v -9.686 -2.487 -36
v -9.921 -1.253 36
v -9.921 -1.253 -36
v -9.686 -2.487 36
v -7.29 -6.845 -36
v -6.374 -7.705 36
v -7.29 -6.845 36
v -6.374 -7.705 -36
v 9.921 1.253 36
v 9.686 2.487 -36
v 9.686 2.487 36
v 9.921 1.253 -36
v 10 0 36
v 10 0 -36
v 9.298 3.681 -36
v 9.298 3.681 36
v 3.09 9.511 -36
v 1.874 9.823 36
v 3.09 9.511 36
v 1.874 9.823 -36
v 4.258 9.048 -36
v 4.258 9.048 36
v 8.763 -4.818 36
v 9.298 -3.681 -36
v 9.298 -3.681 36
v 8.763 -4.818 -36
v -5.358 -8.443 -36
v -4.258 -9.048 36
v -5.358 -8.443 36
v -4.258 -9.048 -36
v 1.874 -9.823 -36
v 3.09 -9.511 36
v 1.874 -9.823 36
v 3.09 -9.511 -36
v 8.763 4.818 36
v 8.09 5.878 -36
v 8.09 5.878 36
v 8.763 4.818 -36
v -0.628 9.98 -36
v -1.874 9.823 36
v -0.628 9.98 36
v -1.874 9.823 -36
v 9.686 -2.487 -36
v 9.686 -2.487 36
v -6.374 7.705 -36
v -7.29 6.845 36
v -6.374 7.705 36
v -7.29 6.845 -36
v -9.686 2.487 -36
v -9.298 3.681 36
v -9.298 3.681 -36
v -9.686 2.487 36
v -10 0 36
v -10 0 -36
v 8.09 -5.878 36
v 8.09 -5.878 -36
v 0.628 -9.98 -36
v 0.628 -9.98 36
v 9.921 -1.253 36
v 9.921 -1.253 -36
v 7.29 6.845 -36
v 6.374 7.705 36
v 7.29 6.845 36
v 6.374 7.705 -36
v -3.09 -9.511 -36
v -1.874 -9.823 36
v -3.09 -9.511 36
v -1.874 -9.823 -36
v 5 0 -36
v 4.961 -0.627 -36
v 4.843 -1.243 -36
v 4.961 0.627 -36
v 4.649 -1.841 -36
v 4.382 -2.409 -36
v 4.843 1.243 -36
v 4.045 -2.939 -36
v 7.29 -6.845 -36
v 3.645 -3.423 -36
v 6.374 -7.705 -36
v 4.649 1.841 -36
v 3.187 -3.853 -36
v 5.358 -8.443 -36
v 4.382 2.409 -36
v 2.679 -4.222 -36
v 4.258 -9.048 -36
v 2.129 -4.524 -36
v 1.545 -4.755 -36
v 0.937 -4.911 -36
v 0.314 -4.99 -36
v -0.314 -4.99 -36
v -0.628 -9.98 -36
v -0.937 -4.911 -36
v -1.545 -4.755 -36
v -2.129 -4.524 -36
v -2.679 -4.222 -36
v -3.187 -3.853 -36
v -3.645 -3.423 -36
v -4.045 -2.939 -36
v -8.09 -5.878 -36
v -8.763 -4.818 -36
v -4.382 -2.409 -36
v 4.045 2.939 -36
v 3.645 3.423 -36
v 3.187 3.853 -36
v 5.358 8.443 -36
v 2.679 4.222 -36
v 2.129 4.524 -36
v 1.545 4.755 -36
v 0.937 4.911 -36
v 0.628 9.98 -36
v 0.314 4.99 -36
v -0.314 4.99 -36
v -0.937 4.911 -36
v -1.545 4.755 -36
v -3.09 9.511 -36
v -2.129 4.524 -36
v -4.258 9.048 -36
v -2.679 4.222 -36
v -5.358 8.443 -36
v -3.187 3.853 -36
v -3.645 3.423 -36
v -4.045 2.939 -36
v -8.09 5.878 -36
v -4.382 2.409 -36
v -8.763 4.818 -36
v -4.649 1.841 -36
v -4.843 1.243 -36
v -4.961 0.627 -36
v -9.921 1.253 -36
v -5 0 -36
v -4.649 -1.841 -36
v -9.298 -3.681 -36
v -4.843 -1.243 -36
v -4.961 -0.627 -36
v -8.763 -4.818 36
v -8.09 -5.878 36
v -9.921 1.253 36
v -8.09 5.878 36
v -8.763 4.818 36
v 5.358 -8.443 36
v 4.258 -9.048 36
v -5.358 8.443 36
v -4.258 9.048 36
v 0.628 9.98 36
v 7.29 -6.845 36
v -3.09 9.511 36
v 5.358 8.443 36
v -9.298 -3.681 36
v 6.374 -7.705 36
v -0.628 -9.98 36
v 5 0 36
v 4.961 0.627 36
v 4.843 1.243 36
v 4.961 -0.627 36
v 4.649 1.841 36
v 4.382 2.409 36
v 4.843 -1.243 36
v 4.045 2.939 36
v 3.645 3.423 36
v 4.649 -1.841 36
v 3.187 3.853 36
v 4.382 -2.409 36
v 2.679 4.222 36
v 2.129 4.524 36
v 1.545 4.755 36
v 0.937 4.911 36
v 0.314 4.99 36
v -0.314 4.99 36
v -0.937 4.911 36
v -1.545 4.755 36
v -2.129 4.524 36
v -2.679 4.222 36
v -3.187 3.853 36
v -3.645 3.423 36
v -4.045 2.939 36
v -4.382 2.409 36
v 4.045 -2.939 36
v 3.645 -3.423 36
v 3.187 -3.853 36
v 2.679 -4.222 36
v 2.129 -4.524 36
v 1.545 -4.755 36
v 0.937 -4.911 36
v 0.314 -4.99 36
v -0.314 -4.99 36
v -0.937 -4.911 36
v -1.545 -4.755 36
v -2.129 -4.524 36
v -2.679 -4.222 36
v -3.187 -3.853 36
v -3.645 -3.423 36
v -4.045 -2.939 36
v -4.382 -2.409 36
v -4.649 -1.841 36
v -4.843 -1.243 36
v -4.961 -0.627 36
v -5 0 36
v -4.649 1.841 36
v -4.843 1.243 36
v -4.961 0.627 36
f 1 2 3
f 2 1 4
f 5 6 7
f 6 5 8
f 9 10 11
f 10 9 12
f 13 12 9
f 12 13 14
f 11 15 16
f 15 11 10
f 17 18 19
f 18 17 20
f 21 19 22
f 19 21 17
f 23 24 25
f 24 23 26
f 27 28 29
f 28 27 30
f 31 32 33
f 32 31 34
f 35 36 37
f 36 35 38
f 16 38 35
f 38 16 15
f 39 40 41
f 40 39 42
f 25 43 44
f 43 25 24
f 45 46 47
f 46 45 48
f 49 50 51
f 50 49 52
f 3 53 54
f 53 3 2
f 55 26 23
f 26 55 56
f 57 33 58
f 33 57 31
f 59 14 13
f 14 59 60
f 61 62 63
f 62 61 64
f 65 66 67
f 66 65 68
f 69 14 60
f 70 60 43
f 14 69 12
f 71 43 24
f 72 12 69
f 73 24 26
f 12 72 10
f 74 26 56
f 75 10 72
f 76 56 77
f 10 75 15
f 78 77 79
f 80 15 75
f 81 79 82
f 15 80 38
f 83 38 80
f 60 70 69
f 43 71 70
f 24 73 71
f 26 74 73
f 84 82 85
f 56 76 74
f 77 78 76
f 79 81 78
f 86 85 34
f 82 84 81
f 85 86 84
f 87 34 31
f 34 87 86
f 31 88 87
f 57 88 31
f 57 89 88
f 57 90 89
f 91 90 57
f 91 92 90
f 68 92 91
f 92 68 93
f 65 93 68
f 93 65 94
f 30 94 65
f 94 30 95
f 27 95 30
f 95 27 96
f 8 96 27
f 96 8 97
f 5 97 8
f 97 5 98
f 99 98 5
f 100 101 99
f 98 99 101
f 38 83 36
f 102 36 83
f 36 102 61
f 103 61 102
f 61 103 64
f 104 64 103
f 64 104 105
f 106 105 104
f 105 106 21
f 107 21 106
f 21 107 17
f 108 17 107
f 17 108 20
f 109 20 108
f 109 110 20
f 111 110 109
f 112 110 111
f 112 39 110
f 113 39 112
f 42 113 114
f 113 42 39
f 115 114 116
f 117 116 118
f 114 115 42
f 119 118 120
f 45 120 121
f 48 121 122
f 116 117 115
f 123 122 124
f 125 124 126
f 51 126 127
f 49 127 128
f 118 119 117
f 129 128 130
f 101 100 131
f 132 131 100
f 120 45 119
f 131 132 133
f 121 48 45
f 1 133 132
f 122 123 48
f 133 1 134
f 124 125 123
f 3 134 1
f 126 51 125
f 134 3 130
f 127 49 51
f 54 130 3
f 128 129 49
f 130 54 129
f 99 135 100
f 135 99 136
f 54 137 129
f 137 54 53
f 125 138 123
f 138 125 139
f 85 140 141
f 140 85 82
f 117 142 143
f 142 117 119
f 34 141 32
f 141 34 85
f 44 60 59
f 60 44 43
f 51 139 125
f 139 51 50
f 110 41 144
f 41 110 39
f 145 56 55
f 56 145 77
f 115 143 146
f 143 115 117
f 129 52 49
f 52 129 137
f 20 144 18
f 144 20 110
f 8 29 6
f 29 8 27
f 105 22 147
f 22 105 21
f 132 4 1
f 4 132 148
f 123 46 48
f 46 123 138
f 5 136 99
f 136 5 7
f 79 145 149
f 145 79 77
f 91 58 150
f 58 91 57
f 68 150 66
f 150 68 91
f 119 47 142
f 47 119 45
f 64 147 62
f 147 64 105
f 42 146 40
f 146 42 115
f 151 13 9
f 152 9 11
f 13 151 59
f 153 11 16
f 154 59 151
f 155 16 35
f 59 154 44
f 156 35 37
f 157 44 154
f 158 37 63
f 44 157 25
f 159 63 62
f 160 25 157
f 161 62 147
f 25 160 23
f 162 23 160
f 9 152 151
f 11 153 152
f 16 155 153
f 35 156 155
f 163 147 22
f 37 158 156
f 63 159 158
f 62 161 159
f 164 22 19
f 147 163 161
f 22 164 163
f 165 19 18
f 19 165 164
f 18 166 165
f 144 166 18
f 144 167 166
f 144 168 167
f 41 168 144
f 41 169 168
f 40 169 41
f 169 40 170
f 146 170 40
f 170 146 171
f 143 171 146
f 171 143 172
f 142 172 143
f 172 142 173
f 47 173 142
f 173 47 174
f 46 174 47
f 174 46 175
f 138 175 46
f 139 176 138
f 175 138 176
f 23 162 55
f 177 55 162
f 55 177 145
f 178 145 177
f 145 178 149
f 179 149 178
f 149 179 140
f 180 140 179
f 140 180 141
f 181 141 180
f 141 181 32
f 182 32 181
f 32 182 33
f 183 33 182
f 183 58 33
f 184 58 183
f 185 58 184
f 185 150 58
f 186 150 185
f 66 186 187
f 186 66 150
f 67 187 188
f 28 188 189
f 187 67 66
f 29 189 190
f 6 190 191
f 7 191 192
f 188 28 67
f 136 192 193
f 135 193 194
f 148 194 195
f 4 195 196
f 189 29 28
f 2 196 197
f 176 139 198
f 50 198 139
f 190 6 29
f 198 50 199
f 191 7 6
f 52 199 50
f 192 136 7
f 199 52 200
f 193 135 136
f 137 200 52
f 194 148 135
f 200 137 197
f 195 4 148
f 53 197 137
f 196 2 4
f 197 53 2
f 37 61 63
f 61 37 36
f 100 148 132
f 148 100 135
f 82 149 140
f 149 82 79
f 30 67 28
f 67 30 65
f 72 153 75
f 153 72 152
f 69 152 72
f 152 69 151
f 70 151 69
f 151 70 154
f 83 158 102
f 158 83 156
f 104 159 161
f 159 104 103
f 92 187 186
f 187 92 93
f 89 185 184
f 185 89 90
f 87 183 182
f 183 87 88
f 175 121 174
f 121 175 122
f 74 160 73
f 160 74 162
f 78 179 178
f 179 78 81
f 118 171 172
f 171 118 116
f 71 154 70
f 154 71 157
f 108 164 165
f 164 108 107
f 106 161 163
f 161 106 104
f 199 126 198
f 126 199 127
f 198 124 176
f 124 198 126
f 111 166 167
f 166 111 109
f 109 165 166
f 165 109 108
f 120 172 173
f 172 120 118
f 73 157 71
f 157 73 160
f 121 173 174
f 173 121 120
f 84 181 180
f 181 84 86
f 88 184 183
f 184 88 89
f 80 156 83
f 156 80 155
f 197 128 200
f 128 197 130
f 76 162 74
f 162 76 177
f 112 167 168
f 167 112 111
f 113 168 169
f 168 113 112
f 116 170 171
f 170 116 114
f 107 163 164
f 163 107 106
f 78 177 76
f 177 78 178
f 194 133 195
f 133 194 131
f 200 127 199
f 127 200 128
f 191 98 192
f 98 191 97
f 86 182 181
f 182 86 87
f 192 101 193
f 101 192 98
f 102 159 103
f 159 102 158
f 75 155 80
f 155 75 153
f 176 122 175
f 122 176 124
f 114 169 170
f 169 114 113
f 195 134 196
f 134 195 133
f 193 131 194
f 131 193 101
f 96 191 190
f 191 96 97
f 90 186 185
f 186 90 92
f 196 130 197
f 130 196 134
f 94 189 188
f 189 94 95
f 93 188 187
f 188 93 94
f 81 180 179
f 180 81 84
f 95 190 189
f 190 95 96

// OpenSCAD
$fn = 50;


difference() {
	union() {
		translate(v = [0, 0, -36.0000000000]) {
			cylinder(h = 72, r = 10.0000000000);
		}
	}
	union() {
		translate(v = [0, 0, -100.0000000000]) {
			cylinder(h = 200, r = 5.0000000000);
		}
	}
}
